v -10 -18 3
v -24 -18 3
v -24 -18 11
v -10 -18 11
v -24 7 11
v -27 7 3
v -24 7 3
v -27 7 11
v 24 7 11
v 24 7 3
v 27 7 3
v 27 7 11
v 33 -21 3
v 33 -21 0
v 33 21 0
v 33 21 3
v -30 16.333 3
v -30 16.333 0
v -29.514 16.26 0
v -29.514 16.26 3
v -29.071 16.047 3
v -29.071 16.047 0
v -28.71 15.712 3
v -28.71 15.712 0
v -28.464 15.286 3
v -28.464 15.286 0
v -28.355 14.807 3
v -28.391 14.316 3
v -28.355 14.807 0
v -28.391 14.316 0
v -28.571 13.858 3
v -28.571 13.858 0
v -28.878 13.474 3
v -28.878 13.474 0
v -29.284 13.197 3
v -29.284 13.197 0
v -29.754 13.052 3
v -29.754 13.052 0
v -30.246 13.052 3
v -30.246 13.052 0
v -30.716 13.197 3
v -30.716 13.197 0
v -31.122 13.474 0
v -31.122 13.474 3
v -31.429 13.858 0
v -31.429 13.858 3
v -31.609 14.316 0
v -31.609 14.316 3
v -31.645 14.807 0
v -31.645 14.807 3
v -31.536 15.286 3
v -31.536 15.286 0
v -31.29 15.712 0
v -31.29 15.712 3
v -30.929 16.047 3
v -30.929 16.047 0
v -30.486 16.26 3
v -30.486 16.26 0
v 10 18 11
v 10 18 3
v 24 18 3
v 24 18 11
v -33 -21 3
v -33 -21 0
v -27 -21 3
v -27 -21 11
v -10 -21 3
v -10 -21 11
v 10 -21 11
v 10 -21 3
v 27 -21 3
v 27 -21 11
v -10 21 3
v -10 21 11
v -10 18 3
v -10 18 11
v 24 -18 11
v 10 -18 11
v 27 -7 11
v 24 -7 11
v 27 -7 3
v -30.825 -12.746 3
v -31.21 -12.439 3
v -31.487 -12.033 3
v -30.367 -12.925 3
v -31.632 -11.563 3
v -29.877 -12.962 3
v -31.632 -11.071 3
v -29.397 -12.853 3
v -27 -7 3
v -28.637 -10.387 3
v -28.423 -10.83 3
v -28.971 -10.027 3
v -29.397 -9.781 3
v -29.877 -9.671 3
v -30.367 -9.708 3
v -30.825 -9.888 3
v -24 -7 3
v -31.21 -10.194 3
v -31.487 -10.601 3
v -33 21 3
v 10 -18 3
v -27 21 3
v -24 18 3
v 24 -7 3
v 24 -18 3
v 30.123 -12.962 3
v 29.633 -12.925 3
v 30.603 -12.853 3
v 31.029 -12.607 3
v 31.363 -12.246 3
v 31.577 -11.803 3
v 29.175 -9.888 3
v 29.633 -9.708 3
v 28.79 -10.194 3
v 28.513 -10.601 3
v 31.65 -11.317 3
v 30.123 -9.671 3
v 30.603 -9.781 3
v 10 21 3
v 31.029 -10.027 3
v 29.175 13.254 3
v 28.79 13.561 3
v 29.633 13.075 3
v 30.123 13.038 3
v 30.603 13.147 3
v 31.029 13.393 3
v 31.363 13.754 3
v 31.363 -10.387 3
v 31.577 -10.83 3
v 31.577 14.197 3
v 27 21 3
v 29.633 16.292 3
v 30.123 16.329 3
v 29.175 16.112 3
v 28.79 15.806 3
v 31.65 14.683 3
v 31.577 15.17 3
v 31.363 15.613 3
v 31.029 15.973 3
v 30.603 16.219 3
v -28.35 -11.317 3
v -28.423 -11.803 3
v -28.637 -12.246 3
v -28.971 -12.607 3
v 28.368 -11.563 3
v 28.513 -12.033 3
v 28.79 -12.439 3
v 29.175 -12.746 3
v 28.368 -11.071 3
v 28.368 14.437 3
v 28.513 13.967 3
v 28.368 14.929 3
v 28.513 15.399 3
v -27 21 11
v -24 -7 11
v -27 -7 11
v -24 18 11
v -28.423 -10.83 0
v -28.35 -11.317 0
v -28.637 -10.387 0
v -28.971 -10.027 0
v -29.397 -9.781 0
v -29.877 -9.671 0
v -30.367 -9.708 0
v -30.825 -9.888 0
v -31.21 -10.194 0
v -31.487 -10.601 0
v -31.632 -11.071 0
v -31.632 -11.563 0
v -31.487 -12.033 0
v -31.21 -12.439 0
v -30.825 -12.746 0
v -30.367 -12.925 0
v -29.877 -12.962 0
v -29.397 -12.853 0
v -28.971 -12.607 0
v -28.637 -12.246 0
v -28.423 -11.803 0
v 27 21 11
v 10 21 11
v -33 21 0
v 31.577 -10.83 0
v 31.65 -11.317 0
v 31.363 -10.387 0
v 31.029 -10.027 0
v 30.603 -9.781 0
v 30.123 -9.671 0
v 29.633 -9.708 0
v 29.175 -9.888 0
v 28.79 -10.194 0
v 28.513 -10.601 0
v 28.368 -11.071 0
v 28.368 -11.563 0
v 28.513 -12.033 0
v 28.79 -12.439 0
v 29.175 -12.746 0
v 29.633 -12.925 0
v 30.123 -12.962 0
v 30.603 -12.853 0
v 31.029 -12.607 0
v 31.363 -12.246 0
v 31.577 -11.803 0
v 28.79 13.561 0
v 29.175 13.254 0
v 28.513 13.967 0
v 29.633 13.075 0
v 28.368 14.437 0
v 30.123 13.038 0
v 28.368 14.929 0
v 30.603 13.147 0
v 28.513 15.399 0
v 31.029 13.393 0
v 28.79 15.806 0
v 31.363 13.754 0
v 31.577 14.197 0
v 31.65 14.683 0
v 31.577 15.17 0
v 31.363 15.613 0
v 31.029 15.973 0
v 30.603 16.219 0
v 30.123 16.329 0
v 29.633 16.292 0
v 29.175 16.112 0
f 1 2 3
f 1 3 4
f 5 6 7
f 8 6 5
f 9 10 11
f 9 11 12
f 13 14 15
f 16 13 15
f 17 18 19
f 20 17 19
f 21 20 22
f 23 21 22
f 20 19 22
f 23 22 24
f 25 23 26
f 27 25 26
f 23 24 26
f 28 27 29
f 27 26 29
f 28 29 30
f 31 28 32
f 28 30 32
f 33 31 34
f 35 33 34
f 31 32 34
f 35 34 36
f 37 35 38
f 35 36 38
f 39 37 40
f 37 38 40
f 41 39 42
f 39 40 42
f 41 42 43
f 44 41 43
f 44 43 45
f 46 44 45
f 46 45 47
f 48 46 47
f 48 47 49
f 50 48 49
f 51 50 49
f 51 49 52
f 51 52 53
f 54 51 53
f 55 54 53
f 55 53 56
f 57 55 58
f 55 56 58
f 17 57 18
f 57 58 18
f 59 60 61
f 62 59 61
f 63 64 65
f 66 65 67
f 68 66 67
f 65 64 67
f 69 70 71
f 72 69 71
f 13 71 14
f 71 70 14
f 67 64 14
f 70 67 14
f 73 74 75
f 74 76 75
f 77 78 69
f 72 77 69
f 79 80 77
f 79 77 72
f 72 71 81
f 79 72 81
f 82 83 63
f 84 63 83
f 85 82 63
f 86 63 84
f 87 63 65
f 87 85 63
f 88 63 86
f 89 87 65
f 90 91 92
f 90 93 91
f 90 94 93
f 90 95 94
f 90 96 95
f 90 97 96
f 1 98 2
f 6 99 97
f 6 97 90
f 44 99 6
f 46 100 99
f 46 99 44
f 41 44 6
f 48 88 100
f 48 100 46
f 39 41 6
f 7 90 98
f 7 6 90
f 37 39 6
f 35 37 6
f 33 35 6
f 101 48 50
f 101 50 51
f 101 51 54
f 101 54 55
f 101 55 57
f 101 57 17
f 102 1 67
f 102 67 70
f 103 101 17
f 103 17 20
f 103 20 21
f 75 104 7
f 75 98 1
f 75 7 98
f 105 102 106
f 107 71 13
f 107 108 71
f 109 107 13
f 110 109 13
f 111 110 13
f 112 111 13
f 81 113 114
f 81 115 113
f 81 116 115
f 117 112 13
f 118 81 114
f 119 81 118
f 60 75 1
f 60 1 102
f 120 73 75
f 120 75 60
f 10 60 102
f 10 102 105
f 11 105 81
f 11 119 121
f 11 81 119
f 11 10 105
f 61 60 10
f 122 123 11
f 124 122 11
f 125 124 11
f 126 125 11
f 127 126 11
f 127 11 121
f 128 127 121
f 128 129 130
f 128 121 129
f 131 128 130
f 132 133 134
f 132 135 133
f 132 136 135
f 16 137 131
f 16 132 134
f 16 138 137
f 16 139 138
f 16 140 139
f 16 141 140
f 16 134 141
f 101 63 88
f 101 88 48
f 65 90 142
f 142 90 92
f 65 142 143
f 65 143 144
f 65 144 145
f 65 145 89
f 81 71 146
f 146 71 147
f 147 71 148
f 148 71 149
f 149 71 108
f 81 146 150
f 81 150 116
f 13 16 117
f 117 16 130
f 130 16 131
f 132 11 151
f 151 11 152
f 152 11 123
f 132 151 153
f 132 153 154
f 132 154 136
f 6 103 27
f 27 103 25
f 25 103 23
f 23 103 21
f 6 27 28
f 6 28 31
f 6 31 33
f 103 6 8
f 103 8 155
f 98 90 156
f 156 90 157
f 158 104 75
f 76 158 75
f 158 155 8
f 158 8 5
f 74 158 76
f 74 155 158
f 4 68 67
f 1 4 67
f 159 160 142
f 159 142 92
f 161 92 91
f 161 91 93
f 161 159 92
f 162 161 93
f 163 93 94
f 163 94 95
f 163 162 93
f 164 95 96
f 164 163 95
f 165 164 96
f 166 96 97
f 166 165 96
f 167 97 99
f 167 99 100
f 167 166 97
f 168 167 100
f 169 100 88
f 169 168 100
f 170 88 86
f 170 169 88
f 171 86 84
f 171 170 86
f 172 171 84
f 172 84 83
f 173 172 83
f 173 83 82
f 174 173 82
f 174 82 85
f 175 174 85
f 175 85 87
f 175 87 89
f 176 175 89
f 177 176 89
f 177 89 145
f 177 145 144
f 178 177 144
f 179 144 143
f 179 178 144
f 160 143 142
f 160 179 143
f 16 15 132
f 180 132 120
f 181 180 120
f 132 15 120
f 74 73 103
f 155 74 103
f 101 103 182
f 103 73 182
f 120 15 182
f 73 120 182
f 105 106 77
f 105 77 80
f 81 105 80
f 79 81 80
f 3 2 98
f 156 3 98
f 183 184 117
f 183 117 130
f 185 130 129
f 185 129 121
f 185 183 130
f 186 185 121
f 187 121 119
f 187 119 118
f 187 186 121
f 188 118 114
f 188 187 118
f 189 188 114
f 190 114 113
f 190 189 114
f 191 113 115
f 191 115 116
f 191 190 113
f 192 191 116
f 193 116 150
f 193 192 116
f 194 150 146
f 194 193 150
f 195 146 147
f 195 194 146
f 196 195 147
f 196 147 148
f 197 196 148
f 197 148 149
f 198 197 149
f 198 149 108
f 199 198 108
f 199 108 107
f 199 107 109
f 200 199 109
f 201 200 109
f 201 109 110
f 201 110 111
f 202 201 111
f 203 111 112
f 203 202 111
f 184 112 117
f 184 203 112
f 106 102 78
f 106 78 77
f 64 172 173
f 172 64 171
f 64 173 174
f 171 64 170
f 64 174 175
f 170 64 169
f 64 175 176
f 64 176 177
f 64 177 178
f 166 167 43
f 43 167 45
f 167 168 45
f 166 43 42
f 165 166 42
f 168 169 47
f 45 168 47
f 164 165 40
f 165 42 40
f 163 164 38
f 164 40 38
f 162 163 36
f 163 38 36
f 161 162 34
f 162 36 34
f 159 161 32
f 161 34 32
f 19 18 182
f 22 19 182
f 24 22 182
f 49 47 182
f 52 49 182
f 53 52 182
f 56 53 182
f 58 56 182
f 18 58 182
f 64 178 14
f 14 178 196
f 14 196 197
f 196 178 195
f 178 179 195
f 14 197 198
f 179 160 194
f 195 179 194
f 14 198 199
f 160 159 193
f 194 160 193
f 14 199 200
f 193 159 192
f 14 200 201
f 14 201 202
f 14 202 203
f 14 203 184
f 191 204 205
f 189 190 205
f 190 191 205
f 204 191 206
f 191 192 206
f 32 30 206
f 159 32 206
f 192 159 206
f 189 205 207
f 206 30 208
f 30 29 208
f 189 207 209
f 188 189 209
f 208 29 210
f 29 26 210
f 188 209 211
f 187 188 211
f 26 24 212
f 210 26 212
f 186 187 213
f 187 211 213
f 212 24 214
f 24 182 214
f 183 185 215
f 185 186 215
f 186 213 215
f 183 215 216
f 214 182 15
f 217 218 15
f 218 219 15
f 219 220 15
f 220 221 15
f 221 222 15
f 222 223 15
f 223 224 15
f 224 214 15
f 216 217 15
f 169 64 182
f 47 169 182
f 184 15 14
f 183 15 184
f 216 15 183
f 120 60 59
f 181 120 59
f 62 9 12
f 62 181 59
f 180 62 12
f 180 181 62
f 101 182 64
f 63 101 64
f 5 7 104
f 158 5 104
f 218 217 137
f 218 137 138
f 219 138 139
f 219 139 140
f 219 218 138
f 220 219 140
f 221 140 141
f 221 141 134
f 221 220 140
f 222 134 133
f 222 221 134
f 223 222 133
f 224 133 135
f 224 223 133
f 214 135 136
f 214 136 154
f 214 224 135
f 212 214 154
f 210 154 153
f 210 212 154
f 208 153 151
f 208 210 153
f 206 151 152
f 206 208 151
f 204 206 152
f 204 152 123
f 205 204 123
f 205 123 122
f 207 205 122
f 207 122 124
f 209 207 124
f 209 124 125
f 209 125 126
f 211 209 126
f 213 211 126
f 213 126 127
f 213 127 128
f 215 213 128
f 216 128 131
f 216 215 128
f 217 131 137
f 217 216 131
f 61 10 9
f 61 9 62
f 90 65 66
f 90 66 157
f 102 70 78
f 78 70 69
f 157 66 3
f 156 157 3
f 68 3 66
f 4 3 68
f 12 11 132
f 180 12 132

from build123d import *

# Parameters (mm, degrees)
SKETCH_1_R               = 1.65
EXTRUDE_3_DEPTH          = 3
SKETCH_3_W               = 54
SKETCH_3_H               = 42
SKETCH_3_W_2             = 48
SKETCH_3_H_2             = 36
EXTRUDE_4_DEPTH          = 8
CUT_EXTRUDE_1_DEPTH      = 1
CUT_EXTRUDE_1_DEPTH_BACK = 43
SKETCH_5_W               = 8
SKETCH_5_H               = 14
CUT_EXTRUDE_2_DEPTH      = 61


with BuildPart() as part:
    # 草图1 → 凸台-拉伸3 (new body)
    with BuildSketch(Plane.XY):
        Polygon((0, 21), (-30, 21), (-33, 21), (-33, -21), (33, -21), (33, 21), align=None)
        with Locations((-30, -11.316768896)):
            Circle(SKETCH_1_R, mode=Mode.SUBTRACT)
        with BuildLine():
            ThreePointArc((-30, 13.033231104), (-31.65, 14.683231104), (-30, 16.333231104))
            ThreePointArc((-30, 16.333231104), (-28.35, 14.683231104), (-30, 13.033231104))
        make_face(mode=Mode.SUBTRACT)
        with Locations((30, 14.683231104)):
            Circle(SKETCH_1_R, mode=Mode.SUBTRACT)
        with Locations((30, -11.316768896)):
            Circle(SKETCH_1_R, mode=Mode.SUBTRACT)
    extrude(amount=EXTRUDE_3_DEPTH)

    # 草图3 → 凸台-拉伸4 (add)
    with BuildSketch(Plane.XY.offset(3)):
        Rectangle(SKETCH_3_W, SKETCH_3_H)
        Rectangle(SKETCH_3_W_2, SKETCH_3_H_2, mode=Mode.SUBTRACT)
    extrude(amount=EXTRUDE_4_DEPTH)

    # 草图4 → 切除-拉伸1 (cut, two sides)
    with BuildSketch(Plane.XZ.offset(21)) as cut_extrude_1_sk:
        Polygon((-10, 109.769364085), (-10, 11), (-10, 3), (10, 3), (10, 11), (10, 109.769364085), (10, 307.308092254), (-10, 307.308092254), align=None)
    extrude(amount=CUT_EXTRUDE_1_DEPTH, mode=Mode.SUBTRACT)
    extrude(cut_extrude_1_sk.sketch, amount=-CUT_EXTRUDE_1_DEPTH_BACK, mode=Mode.SUBTRACT)

    # 草图5 → 切除-拉伸2 (cut, through all)
    with BuildSketch(Plane.ZY.offset(27)):
        with Locations((7, 0)):
            Rectangle(SKETCH_5_W, SKETCH_5_H)
    extrude(amount=-CUT_EXTRUDE_2_DEPTH, mode=Mode.SUBTRACT)


solid = part.part
